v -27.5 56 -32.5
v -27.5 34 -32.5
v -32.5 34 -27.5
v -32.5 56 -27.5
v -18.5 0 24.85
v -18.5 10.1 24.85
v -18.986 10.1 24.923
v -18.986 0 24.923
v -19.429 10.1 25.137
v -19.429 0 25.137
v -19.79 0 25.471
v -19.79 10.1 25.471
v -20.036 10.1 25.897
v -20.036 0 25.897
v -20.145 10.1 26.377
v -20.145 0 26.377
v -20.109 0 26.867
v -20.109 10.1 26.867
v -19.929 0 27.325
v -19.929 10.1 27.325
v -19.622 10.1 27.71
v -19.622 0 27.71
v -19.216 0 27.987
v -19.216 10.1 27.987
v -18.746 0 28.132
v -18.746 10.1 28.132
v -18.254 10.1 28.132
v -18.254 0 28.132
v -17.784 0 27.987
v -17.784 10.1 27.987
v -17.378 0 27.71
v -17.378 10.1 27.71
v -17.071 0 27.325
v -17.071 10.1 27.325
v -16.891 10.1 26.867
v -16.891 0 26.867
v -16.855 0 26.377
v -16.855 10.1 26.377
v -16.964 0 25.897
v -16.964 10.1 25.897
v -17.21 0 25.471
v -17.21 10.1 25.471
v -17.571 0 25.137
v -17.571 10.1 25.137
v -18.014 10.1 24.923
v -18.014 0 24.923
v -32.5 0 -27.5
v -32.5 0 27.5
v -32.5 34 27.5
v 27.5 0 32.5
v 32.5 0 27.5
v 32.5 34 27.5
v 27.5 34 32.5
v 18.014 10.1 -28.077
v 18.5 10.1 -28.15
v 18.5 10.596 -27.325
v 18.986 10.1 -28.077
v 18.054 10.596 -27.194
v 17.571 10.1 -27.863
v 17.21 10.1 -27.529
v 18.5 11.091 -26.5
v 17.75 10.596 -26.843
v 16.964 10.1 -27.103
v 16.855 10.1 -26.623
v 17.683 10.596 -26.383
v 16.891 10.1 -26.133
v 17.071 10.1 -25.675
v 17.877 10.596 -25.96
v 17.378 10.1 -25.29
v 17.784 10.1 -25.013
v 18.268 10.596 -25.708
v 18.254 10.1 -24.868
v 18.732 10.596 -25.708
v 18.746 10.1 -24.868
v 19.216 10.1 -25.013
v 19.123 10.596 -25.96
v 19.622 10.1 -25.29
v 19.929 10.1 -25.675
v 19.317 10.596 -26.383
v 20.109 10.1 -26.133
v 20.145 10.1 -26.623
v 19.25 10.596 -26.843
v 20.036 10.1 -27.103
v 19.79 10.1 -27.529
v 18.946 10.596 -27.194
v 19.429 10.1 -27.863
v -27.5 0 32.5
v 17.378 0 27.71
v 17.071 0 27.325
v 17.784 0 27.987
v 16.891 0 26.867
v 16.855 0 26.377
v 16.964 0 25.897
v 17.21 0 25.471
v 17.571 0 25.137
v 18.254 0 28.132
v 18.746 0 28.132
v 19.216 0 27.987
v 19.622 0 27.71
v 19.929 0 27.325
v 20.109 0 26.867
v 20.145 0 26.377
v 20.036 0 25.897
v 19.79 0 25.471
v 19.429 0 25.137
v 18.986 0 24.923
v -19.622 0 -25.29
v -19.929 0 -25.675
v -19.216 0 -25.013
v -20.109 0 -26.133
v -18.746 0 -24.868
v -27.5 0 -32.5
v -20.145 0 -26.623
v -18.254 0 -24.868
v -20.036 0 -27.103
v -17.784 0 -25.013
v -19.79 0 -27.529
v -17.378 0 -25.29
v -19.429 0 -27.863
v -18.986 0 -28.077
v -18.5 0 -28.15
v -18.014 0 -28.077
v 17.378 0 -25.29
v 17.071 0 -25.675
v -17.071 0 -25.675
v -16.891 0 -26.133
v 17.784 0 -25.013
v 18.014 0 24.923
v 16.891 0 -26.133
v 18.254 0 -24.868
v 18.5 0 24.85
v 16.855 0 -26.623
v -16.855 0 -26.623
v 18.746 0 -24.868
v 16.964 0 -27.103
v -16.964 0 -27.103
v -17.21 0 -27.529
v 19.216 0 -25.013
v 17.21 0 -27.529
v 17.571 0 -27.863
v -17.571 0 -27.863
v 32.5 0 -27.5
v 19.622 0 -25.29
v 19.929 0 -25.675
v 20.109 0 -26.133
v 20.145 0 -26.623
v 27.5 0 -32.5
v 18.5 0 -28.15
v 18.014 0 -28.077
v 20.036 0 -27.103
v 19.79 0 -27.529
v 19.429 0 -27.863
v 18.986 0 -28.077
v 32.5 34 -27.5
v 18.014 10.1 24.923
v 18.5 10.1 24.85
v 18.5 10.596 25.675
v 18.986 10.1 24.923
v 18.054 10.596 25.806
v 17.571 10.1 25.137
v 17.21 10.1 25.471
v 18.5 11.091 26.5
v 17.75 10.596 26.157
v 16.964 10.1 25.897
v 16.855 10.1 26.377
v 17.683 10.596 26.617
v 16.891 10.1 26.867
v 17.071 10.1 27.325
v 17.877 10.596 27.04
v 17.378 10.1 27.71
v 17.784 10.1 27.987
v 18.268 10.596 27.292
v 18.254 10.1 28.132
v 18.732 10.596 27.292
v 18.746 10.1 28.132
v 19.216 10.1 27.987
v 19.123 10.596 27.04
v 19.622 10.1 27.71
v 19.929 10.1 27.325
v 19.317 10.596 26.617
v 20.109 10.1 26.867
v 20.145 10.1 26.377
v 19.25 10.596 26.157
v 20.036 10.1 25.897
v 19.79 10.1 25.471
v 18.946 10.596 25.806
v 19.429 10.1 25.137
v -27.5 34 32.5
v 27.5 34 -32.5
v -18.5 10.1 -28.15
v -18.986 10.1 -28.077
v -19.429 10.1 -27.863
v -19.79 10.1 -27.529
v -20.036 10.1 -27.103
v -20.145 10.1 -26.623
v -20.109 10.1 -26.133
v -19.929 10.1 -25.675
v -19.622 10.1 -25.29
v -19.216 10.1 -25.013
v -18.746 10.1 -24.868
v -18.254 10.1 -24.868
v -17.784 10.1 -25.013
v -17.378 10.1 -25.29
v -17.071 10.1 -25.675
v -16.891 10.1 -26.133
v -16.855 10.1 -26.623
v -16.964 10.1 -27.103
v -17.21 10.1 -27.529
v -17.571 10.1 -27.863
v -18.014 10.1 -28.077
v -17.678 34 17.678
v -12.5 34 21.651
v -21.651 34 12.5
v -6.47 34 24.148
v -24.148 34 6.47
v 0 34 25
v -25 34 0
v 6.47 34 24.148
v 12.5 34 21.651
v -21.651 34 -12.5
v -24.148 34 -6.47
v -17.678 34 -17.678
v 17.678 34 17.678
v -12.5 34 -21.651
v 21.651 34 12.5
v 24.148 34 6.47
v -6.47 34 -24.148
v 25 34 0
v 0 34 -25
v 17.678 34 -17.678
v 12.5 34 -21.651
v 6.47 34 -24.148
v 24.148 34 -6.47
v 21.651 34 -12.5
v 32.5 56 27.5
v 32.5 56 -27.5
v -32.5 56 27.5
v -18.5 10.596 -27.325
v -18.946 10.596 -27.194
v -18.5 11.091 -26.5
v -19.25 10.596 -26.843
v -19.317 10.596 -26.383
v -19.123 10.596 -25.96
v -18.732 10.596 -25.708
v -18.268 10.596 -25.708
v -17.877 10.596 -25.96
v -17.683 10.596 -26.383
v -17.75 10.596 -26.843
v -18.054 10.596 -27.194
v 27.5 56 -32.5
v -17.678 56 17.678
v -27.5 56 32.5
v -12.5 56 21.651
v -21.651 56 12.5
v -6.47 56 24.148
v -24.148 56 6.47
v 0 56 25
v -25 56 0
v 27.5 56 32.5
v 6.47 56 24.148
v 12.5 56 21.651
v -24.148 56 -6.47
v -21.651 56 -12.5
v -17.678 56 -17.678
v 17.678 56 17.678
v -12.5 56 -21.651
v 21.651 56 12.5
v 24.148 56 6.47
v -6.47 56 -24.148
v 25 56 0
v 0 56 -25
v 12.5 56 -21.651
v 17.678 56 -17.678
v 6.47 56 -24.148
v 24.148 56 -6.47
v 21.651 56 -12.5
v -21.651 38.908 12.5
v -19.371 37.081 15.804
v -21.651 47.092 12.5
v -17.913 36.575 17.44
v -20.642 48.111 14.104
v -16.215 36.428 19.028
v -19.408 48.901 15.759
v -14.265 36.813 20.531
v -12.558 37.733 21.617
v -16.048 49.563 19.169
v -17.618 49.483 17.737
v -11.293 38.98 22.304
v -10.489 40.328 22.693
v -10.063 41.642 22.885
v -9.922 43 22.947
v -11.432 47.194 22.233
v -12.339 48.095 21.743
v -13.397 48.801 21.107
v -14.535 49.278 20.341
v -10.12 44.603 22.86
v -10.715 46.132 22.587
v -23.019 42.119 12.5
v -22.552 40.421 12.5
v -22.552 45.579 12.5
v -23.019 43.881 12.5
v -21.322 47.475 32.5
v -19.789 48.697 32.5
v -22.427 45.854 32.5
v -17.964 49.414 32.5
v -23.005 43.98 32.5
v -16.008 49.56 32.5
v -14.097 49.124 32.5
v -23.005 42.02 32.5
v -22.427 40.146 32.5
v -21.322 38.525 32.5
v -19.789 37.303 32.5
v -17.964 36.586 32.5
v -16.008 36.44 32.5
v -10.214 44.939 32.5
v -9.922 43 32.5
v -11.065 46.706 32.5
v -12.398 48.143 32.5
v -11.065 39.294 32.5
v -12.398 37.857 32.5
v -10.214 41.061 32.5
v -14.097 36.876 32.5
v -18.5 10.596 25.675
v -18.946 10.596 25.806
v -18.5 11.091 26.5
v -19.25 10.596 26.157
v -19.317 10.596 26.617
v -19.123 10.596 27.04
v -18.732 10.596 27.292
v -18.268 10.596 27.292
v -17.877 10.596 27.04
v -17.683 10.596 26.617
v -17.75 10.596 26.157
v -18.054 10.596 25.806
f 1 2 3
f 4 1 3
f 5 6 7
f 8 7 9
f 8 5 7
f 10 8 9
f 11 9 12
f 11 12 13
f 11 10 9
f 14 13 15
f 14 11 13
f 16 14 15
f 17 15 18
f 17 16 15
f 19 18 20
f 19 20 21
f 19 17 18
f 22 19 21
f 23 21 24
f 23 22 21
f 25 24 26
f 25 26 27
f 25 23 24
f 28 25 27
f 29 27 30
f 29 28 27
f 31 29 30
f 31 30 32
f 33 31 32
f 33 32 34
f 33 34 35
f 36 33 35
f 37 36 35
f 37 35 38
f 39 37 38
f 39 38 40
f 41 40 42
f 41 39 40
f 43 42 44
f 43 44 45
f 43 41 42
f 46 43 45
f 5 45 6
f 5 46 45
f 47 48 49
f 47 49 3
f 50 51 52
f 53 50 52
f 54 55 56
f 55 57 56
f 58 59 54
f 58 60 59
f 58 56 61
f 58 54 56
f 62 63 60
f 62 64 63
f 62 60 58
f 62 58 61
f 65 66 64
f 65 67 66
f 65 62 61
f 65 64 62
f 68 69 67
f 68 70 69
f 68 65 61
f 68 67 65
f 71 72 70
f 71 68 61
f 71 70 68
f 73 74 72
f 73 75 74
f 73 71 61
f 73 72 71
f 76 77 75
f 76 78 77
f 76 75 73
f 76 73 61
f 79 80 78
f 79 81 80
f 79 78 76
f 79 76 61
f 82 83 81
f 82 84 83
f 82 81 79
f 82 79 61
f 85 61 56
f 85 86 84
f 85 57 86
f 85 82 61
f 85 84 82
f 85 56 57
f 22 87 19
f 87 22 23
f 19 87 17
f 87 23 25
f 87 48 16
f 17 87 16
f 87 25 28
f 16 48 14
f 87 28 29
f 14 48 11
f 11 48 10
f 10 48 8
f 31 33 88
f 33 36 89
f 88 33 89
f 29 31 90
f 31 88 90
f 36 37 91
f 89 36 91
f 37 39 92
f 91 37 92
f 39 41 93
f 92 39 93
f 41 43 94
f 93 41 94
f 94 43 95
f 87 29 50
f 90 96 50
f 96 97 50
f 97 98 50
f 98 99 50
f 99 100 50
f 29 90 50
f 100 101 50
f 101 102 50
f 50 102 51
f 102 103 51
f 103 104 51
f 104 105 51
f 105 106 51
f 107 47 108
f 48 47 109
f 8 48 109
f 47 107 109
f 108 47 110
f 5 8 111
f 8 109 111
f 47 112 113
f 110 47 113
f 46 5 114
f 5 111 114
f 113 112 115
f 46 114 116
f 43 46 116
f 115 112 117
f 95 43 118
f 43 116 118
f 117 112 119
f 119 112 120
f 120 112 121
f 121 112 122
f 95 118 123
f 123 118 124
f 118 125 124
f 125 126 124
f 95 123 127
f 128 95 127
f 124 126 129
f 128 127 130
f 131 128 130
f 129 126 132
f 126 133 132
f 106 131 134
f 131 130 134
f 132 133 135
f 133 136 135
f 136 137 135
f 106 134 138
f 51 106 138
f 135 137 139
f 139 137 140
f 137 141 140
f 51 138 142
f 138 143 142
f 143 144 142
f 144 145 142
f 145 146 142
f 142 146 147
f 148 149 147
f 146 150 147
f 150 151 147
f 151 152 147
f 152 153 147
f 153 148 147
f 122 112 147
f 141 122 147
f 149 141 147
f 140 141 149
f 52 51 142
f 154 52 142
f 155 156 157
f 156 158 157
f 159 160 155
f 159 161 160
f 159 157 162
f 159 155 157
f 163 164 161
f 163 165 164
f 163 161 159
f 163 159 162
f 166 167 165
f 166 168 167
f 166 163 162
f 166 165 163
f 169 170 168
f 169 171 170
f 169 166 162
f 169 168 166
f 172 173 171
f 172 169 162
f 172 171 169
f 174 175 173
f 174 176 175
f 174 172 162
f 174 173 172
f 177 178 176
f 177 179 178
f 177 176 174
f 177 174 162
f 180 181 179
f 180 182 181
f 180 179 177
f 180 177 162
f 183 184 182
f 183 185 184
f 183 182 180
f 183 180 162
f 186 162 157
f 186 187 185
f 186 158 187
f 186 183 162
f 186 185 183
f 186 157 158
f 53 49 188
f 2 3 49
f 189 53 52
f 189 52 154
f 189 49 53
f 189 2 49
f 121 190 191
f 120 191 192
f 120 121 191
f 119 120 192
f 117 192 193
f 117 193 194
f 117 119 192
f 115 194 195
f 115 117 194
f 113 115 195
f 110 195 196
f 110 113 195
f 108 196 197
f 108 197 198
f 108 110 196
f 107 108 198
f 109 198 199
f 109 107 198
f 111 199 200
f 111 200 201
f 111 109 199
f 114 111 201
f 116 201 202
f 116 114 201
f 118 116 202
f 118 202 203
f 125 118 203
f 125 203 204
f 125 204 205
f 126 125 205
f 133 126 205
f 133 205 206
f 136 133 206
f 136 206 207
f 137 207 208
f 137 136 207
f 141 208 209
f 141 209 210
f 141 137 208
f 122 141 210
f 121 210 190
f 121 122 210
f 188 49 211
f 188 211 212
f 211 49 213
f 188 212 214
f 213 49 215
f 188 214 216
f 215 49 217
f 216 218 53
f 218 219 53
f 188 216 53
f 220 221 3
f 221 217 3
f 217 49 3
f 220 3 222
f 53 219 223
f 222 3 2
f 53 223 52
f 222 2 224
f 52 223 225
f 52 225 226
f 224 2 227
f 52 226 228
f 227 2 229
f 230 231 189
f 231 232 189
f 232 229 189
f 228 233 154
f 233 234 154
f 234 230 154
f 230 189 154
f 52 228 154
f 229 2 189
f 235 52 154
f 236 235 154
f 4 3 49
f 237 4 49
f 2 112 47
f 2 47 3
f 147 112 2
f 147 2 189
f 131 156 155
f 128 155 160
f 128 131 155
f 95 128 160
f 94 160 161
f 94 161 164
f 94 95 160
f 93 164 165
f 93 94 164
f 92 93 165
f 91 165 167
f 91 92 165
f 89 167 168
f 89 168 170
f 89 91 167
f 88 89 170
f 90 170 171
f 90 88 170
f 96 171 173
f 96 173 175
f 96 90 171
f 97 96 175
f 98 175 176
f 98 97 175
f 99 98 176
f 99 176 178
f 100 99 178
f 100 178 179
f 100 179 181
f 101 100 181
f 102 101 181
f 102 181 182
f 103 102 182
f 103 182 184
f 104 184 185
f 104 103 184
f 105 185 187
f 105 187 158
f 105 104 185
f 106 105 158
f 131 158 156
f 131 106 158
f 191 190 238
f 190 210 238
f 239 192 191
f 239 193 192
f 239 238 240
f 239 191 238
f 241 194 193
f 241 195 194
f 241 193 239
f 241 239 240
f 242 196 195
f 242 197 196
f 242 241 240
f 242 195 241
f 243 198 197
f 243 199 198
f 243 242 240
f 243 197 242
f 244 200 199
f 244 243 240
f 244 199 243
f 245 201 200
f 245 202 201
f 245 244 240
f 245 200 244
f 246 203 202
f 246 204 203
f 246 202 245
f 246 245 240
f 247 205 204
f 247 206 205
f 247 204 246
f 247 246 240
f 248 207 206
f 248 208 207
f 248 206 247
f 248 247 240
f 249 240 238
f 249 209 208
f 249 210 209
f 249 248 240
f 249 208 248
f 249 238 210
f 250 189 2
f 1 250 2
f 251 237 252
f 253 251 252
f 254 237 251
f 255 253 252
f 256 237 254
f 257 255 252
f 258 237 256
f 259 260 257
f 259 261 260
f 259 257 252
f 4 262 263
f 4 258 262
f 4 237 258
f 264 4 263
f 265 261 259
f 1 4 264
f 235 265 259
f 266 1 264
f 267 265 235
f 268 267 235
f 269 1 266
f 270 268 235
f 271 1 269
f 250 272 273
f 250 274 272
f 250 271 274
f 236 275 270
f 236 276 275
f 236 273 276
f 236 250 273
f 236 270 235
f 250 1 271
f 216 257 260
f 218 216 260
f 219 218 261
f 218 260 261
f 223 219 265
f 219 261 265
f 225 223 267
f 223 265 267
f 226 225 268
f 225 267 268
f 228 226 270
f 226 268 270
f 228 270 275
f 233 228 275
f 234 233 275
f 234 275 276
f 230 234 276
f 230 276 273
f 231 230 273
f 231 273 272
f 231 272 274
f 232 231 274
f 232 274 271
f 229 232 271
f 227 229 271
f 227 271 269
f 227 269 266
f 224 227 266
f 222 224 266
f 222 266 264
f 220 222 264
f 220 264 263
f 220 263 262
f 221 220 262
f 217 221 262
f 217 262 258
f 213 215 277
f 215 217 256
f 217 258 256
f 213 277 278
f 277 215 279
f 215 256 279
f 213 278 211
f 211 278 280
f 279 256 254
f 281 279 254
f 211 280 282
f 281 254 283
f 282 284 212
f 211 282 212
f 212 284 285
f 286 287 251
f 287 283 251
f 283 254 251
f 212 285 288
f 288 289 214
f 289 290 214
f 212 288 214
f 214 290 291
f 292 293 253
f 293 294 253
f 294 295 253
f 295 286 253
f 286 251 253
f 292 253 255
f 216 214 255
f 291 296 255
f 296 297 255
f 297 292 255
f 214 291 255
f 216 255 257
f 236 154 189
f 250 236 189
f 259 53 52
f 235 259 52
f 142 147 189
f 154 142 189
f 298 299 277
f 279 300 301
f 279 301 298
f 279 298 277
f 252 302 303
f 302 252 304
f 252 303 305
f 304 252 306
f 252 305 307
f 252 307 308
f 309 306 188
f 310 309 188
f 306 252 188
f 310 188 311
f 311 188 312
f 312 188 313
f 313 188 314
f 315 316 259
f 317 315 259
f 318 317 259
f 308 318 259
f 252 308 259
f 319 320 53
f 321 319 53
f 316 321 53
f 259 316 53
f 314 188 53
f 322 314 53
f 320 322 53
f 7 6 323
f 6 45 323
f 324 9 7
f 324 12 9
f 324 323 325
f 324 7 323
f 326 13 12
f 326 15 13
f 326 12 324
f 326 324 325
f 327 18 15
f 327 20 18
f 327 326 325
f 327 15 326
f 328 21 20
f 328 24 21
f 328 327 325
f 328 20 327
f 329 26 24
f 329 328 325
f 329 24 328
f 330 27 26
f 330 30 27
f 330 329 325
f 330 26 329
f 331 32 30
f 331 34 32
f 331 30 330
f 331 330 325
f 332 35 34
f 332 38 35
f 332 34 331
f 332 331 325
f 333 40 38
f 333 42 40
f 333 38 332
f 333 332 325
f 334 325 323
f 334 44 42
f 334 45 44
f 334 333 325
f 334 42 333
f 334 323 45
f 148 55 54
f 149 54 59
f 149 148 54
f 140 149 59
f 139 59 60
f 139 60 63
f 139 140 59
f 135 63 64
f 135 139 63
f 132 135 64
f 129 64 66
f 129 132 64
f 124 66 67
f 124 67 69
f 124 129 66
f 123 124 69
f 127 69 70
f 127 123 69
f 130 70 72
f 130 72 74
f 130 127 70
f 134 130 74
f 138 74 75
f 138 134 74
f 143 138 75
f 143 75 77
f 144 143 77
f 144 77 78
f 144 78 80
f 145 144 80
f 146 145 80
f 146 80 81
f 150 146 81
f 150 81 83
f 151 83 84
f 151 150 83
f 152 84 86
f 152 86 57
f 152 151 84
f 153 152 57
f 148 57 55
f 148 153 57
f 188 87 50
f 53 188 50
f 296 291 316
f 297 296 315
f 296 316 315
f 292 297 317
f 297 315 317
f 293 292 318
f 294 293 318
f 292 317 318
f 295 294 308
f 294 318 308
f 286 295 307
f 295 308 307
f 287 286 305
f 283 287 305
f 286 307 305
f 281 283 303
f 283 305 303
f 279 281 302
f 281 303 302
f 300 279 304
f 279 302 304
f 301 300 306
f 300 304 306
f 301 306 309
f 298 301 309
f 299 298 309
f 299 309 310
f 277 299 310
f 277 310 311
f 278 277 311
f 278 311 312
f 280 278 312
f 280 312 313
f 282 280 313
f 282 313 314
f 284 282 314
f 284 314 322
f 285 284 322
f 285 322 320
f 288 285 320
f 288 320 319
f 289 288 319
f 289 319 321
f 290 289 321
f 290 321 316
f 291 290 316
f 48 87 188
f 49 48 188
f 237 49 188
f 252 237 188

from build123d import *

# Parameters (mm, degrees)
SKETCH1_W                      = 65
SKETCH1_H                      = 65
BOSS_EXTRUDE1_DEPTH            = 34
CHAMFER1_SIZE                  = 5
BOSS_EXTRUDE2_DEPTH            = 22
SKETCH3_R                      = 6.5785
CUT_EXTRUDE1_DEPTH             = 20
CUT_EXTRUDE2_START             = 56
SKETCH1_3_R                    = 25
CUT_EXTRUDE2_DEPTH             = 22
M4X0_7_TAPPED_HOLE1_AT_2_COUNT = 2
M4X0_7_TAPPED_HOLE1_AT_2_PITCH = 37
M4X0_7_TAPPED_HOLE1_AT_3_COUNT = 2
M4X0_7_TAPPED_HOLE1_AT_3_PITCH = 53
M4X0_7_TAPPED_HOLE1_AT_4_COUNT = 2
M4X0_7_TAPPED_HOLE1_AT_4_PITCH = 64.637450445


with BuildPart() as part:
    # Sketch1 → Boss-Extrude1 (new body)
    with BuildSketch(Plane(origin=(0, 0, 0), x_dir=(1, 0, 0), z_dir=(0, 1, 0))):
        Rectangle(SKETCH1_W, SKETCH1_H)
    extrude(amount=BOSS_EXTRUDE1_DEPTH)

    # Chamfer1
    chamfer1_edges = [part.edges().sort_by_distance(p)[0] for p in [
        (-32.5, 17, 32.5),
        (-32.5, 17, -32.5),
        (32.5, 17, -32.5),
        (32.5, 17, 32.5),
    ]]
    chamfer(chamfer1_edges, length=CHAMFER1_SIZE)

    # Sketch5 → M4x0.7 Tapped Hole1 (revolve, cut)
    with BuildSketch(Plane(origin=(18.5, 0, -26.5), x_dir=(0, 0, -1), z_dir=(1, 0, 0))):
        Polygon((0, 0), (0, 11.091420021), (1.65, 10.1), (1.65, 0), align=None)
    m4x0_7_tapped_hole1 = revolve(axis=Axis((18.5, -6.35, -26.5), (0, 1, 0)), mode=Mode.SUBTRACT)

    # M4x0.7 Tapped Hole1 at 2: M4x0.7 Tapped Hole1 ×2
    with Locations(*[(-i * M4X0_7_TAPPED_HOLE1_AT_2_PITCH, 0, 0) for i in range(1, M4X0_7_TAPPED_HOLE1_AT_2_COUNT)]):
        add(m4x0_7_tapped_hole1, mode=Mode.SUBTRACT)

    # M4x0.7 Tapped Hole1 at 3: M4x0.7 Tapped Hole1 ×2
    with Locations(*[(0, 0, i * M4X0_7_TAPPED_HOLE1_AT_3_PITCH) for i in range(1, M4X0_7_TAPPED_HOLE1_AT_3_COUNT)]):
        add(m4x0_7_tapped_hole1, mode=Mode.SUBTRACT)

    # M4x0.7 Tapped Hole1 at 4: M4x0.7 Tapped Hole1 ×2
    with Locations(*[Vector(-0.5724235678450125, 0, 0.8199580836698828) * (i * M4X0_7_TAPPED_HOLE1_AT_4_PITCH) for i in range(1, M4X0_7_TAPPED_HOLE1_AT_4_COUNT)]):
        add(m4x0_7_tapped_hole1, mode=Mode.SUBTRACT)


with BuildPart() as body_2:
    # Sketch2 → Boss-Extrude2 (new body)
    with BuildSketch(Plane(origin=(0, 34, 0), x_dir=(1, 0, 0), z_dir=(0, 1, 0))):
        Polygon((27.5, 32.5), (-27.5, 32.5), (-32.5, 27.5), (-32.5, -27.5), (-27.5, -32.5), (27.5, -32.5), (32.5, -27.5), (32.5, 27.5), align=None)
    extrude(amount=BOSS_EXTRUDE2_DEPTH)

    # Sketch3 → Cut-Extrude1 (cut)
    with BuildSketch(Plane.XY.offset(32.5)):
        with Locations((-16.5, 43)):
            Circle(SKETCH3_R)
    extrude(amount=-CUT_EXTRUDE1_DEPTH, mode=Mode.SUBTRACT)

    # Sketch1<3> → Cut-Extrude2 (cut)
    with BuildSketch(Plane(origin=(0, 0, 0), x_dir=(1, 0, 0), z_dir=(0, 1, 0)).offset(CUT_EXTRUDE2_START)):
        with Locations(Location((0, 0, 0), (0, 0, 270))):
            Circle(SKETCH1_3_R)
    extrude(amount=-CUT_EXTRUDE2_DEPTH, mode=Mode.SUBTRACT)


solid = Compound([part.part, body_2.part])
